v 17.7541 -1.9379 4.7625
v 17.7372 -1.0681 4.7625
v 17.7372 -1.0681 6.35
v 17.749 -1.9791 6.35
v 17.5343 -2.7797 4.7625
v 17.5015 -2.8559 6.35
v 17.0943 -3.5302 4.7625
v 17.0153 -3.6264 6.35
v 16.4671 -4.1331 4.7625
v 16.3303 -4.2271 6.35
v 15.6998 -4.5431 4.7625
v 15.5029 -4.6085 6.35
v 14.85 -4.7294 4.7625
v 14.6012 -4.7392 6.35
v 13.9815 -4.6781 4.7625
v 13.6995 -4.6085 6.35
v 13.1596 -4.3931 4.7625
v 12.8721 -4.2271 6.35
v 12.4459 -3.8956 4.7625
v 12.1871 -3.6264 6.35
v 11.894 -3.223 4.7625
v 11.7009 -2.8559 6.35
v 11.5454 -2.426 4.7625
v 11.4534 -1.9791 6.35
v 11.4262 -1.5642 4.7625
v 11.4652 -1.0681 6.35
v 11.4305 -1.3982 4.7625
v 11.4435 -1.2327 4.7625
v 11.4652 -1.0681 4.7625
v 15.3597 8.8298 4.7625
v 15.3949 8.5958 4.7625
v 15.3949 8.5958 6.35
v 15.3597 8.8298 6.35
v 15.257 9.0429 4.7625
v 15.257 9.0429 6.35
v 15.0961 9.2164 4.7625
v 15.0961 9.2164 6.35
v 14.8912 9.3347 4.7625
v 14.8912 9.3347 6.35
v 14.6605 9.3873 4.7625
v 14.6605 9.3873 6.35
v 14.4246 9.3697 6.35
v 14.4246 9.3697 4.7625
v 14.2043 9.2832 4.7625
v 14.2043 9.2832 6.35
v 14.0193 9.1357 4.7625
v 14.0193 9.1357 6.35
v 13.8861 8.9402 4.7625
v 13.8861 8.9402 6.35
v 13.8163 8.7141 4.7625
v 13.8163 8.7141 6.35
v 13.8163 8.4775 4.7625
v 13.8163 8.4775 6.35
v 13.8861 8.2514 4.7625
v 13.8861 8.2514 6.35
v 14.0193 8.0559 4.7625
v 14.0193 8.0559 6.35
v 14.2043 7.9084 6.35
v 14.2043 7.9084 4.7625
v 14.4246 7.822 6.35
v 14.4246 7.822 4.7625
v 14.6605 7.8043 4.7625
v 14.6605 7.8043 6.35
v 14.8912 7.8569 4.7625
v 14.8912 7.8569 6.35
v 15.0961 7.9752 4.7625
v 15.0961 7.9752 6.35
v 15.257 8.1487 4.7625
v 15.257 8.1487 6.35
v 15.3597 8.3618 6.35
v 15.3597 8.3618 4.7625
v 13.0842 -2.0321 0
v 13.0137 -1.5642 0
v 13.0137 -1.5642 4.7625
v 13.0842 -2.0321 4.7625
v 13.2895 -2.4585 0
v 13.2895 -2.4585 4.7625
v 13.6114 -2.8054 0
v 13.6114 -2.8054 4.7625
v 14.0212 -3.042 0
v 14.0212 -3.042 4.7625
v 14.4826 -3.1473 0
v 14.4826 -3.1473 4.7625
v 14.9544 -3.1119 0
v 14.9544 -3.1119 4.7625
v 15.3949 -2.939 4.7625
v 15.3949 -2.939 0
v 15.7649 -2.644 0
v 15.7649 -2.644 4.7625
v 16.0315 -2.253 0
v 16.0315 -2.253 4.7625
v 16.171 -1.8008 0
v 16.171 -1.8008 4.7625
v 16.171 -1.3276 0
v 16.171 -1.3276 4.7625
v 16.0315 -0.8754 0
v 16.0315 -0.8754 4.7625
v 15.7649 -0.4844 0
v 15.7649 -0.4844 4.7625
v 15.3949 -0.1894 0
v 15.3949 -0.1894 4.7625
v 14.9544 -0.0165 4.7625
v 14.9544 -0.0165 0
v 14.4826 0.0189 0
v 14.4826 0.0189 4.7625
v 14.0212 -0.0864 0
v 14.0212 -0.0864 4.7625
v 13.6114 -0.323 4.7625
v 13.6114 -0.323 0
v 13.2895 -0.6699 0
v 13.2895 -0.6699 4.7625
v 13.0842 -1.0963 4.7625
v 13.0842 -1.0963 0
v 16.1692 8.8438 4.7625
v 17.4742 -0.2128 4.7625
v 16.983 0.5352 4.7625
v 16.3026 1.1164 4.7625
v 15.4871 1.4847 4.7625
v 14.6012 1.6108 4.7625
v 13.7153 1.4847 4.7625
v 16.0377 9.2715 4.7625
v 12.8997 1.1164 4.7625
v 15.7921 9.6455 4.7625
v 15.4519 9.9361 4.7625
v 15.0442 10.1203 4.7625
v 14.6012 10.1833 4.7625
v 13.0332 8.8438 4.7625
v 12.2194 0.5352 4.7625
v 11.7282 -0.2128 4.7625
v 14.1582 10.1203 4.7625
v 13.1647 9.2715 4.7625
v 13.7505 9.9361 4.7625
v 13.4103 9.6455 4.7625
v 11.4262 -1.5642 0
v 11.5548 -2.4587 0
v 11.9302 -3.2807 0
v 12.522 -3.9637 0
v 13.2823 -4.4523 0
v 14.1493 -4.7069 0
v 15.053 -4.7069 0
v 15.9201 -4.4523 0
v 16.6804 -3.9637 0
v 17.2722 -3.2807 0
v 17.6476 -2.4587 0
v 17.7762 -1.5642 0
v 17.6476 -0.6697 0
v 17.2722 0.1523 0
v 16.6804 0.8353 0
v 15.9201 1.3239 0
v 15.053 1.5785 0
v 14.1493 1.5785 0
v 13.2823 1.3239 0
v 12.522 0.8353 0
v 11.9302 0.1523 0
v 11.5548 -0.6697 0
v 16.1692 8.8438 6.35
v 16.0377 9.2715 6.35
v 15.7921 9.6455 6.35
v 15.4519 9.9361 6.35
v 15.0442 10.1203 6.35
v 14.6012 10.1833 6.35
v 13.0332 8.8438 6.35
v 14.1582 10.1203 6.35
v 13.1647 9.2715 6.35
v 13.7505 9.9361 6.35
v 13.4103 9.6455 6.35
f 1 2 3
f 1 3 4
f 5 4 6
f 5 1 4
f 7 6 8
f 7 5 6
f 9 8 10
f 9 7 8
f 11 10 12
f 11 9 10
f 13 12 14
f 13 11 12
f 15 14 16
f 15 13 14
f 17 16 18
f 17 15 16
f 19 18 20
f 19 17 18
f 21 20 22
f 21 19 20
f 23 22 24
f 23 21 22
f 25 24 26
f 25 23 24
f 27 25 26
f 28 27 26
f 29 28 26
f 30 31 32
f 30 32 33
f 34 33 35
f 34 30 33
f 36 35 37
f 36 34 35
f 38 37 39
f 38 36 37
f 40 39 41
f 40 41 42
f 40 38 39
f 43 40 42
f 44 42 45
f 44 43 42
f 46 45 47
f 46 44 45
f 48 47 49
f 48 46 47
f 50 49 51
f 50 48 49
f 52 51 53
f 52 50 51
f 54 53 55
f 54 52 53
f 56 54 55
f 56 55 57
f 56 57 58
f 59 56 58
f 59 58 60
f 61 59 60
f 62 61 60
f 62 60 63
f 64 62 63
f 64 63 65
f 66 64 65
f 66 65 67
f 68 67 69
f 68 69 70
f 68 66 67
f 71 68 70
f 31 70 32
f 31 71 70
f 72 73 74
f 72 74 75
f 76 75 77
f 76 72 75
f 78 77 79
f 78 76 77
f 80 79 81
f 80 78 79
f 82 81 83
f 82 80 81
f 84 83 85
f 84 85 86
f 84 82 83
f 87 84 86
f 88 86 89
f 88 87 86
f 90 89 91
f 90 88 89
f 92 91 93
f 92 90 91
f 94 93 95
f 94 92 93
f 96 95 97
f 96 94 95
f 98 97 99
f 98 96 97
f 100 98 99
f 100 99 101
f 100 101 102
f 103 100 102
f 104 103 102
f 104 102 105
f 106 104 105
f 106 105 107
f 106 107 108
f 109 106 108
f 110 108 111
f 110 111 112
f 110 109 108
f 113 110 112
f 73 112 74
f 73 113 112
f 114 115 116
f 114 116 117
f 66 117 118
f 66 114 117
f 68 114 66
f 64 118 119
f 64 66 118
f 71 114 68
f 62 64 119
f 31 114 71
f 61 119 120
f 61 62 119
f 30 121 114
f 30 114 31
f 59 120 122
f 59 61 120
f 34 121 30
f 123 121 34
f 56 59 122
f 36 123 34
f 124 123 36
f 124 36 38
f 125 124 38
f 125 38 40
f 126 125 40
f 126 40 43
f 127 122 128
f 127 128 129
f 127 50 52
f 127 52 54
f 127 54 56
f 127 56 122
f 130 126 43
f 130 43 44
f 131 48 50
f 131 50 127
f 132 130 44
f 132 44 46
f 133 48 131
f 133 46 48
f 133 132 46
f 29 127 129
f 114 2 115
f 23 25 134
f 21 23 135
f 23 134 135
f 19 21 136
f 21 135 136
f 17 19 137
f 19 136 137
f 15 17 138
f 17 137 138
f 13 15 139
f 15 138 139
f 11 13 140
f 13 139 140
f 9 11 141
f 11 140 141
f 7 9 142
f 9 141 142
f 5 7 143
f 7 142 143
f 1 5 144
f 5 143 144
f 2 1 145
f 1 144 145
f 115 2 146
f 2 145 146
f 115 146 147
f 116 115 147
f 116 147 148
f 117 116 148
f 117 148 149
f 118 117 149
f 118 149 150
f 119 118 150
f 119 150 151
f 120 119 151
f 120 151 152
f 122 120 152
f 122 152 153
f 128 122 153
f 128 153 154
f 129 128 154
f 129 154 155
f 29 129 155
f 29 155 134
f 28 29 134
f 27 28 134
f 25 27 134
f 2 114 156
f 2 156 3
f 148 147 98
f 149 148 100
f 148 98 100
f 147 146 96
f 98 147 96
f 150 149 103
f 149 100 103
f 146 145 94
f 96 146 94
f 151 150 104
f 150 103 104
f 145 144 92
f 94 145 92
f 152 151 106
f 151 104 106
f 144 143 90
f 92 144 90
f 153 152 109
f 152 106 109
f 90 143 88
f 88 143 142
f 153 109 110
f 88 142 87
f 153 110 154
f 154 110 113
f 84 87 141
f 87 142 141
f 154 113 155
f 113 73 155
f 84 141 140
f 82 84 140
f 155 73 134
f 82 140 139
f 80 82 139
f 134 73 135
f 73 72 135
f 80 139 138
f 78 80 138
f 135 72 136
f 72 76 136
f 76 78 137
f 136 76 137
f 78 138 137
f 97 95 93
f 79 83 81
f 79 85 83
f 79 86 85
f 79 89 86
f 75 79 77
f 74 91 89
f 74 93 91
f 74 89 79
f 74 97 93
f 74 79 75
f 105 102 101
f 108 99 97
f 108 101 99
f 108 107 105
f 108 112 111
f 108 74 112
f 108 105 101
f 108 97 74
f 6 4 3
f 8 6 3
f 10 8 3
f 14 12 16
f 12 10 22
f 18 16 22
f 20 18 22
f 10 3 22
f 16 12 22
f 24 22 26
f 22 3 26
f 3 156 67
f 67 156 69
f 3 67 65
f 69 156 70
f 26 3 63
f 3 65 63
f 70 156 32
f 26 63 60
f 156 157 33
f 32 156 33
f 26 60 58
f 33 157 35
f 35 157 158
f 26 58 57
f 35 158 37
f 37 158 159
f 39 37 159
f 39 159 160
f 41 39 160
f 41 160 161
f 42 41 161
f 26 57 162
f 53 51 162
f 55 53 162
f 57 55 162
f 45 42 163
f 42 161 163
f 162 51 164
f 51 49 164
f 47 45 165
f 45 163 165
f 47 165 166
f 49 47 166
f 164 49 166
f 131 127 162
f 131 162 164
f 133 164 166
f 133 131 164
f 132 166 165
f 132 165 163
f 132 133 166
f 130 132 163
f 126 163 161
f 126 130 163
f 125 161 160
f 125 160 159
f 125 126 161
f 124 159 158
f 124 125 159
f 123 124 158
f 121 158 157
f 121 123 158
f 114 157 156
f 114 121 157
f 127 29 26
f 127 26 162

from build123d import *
from build123d.topology import SkipClean

# Parameters (mm, degrees)
SKETCH1_R           = 3.175
SKETCH1_R_2         = 1.5875
BOSS_EXTRUDE1_DEPTH = 4.7625
SKETCH2_R           = 0.79375
BOSS_EXTRUDE2_DEPTH = 1.5875


with BuildPart() as part:
    # Sketch1 → Boss-Extrude1 (new body)
    with BuildSketch(Plane.XY):
        with Locations(Location((14.60119787, -1.564197578, 0), (0, 0, 180))):
            Circle(SKETCH1_R)
        with Locations(Location((14.60119787, -1.564197578, 0), (0, 0, 180))):
            Circle(SKETCH1_R_2, mode=Mode.SUBTRACT)
    extrude(amount=BOSS_EXTRUDE1_DEPTH)

    # Sketch2 → Boss-Extrude2 (add)
    with SkipClean():  # the faces are left unmerged after this step: merging them gives an invalid solid
        with BuildSketch(Plane.XY.offset(4.7625)):
            with BuildLine():
                Line((11.465194702, -1.068103704), (13.033196686, 8.843849359))
                ThreePointArc((13.033196686, 8.843849359), (14.60119833, 10.183302422), (16.169199873, 8.843849241))
                Line((16.169199873, 8.843849241), (17.737201077, -1.068103951))
                ThreePointArc((17.737201077, -1.068103951), (14.601197744, -4.739197578), (11.465194702, -1.068103704))
            make_face()
            with Locations((14.60119827, 8.595802422)):
                Circle(SKETCH2_R, mode=Mode.SUBTRACT)
        extrude(amount=BOSS_EXTRUDE2_DEPTH)


solid = part.part
